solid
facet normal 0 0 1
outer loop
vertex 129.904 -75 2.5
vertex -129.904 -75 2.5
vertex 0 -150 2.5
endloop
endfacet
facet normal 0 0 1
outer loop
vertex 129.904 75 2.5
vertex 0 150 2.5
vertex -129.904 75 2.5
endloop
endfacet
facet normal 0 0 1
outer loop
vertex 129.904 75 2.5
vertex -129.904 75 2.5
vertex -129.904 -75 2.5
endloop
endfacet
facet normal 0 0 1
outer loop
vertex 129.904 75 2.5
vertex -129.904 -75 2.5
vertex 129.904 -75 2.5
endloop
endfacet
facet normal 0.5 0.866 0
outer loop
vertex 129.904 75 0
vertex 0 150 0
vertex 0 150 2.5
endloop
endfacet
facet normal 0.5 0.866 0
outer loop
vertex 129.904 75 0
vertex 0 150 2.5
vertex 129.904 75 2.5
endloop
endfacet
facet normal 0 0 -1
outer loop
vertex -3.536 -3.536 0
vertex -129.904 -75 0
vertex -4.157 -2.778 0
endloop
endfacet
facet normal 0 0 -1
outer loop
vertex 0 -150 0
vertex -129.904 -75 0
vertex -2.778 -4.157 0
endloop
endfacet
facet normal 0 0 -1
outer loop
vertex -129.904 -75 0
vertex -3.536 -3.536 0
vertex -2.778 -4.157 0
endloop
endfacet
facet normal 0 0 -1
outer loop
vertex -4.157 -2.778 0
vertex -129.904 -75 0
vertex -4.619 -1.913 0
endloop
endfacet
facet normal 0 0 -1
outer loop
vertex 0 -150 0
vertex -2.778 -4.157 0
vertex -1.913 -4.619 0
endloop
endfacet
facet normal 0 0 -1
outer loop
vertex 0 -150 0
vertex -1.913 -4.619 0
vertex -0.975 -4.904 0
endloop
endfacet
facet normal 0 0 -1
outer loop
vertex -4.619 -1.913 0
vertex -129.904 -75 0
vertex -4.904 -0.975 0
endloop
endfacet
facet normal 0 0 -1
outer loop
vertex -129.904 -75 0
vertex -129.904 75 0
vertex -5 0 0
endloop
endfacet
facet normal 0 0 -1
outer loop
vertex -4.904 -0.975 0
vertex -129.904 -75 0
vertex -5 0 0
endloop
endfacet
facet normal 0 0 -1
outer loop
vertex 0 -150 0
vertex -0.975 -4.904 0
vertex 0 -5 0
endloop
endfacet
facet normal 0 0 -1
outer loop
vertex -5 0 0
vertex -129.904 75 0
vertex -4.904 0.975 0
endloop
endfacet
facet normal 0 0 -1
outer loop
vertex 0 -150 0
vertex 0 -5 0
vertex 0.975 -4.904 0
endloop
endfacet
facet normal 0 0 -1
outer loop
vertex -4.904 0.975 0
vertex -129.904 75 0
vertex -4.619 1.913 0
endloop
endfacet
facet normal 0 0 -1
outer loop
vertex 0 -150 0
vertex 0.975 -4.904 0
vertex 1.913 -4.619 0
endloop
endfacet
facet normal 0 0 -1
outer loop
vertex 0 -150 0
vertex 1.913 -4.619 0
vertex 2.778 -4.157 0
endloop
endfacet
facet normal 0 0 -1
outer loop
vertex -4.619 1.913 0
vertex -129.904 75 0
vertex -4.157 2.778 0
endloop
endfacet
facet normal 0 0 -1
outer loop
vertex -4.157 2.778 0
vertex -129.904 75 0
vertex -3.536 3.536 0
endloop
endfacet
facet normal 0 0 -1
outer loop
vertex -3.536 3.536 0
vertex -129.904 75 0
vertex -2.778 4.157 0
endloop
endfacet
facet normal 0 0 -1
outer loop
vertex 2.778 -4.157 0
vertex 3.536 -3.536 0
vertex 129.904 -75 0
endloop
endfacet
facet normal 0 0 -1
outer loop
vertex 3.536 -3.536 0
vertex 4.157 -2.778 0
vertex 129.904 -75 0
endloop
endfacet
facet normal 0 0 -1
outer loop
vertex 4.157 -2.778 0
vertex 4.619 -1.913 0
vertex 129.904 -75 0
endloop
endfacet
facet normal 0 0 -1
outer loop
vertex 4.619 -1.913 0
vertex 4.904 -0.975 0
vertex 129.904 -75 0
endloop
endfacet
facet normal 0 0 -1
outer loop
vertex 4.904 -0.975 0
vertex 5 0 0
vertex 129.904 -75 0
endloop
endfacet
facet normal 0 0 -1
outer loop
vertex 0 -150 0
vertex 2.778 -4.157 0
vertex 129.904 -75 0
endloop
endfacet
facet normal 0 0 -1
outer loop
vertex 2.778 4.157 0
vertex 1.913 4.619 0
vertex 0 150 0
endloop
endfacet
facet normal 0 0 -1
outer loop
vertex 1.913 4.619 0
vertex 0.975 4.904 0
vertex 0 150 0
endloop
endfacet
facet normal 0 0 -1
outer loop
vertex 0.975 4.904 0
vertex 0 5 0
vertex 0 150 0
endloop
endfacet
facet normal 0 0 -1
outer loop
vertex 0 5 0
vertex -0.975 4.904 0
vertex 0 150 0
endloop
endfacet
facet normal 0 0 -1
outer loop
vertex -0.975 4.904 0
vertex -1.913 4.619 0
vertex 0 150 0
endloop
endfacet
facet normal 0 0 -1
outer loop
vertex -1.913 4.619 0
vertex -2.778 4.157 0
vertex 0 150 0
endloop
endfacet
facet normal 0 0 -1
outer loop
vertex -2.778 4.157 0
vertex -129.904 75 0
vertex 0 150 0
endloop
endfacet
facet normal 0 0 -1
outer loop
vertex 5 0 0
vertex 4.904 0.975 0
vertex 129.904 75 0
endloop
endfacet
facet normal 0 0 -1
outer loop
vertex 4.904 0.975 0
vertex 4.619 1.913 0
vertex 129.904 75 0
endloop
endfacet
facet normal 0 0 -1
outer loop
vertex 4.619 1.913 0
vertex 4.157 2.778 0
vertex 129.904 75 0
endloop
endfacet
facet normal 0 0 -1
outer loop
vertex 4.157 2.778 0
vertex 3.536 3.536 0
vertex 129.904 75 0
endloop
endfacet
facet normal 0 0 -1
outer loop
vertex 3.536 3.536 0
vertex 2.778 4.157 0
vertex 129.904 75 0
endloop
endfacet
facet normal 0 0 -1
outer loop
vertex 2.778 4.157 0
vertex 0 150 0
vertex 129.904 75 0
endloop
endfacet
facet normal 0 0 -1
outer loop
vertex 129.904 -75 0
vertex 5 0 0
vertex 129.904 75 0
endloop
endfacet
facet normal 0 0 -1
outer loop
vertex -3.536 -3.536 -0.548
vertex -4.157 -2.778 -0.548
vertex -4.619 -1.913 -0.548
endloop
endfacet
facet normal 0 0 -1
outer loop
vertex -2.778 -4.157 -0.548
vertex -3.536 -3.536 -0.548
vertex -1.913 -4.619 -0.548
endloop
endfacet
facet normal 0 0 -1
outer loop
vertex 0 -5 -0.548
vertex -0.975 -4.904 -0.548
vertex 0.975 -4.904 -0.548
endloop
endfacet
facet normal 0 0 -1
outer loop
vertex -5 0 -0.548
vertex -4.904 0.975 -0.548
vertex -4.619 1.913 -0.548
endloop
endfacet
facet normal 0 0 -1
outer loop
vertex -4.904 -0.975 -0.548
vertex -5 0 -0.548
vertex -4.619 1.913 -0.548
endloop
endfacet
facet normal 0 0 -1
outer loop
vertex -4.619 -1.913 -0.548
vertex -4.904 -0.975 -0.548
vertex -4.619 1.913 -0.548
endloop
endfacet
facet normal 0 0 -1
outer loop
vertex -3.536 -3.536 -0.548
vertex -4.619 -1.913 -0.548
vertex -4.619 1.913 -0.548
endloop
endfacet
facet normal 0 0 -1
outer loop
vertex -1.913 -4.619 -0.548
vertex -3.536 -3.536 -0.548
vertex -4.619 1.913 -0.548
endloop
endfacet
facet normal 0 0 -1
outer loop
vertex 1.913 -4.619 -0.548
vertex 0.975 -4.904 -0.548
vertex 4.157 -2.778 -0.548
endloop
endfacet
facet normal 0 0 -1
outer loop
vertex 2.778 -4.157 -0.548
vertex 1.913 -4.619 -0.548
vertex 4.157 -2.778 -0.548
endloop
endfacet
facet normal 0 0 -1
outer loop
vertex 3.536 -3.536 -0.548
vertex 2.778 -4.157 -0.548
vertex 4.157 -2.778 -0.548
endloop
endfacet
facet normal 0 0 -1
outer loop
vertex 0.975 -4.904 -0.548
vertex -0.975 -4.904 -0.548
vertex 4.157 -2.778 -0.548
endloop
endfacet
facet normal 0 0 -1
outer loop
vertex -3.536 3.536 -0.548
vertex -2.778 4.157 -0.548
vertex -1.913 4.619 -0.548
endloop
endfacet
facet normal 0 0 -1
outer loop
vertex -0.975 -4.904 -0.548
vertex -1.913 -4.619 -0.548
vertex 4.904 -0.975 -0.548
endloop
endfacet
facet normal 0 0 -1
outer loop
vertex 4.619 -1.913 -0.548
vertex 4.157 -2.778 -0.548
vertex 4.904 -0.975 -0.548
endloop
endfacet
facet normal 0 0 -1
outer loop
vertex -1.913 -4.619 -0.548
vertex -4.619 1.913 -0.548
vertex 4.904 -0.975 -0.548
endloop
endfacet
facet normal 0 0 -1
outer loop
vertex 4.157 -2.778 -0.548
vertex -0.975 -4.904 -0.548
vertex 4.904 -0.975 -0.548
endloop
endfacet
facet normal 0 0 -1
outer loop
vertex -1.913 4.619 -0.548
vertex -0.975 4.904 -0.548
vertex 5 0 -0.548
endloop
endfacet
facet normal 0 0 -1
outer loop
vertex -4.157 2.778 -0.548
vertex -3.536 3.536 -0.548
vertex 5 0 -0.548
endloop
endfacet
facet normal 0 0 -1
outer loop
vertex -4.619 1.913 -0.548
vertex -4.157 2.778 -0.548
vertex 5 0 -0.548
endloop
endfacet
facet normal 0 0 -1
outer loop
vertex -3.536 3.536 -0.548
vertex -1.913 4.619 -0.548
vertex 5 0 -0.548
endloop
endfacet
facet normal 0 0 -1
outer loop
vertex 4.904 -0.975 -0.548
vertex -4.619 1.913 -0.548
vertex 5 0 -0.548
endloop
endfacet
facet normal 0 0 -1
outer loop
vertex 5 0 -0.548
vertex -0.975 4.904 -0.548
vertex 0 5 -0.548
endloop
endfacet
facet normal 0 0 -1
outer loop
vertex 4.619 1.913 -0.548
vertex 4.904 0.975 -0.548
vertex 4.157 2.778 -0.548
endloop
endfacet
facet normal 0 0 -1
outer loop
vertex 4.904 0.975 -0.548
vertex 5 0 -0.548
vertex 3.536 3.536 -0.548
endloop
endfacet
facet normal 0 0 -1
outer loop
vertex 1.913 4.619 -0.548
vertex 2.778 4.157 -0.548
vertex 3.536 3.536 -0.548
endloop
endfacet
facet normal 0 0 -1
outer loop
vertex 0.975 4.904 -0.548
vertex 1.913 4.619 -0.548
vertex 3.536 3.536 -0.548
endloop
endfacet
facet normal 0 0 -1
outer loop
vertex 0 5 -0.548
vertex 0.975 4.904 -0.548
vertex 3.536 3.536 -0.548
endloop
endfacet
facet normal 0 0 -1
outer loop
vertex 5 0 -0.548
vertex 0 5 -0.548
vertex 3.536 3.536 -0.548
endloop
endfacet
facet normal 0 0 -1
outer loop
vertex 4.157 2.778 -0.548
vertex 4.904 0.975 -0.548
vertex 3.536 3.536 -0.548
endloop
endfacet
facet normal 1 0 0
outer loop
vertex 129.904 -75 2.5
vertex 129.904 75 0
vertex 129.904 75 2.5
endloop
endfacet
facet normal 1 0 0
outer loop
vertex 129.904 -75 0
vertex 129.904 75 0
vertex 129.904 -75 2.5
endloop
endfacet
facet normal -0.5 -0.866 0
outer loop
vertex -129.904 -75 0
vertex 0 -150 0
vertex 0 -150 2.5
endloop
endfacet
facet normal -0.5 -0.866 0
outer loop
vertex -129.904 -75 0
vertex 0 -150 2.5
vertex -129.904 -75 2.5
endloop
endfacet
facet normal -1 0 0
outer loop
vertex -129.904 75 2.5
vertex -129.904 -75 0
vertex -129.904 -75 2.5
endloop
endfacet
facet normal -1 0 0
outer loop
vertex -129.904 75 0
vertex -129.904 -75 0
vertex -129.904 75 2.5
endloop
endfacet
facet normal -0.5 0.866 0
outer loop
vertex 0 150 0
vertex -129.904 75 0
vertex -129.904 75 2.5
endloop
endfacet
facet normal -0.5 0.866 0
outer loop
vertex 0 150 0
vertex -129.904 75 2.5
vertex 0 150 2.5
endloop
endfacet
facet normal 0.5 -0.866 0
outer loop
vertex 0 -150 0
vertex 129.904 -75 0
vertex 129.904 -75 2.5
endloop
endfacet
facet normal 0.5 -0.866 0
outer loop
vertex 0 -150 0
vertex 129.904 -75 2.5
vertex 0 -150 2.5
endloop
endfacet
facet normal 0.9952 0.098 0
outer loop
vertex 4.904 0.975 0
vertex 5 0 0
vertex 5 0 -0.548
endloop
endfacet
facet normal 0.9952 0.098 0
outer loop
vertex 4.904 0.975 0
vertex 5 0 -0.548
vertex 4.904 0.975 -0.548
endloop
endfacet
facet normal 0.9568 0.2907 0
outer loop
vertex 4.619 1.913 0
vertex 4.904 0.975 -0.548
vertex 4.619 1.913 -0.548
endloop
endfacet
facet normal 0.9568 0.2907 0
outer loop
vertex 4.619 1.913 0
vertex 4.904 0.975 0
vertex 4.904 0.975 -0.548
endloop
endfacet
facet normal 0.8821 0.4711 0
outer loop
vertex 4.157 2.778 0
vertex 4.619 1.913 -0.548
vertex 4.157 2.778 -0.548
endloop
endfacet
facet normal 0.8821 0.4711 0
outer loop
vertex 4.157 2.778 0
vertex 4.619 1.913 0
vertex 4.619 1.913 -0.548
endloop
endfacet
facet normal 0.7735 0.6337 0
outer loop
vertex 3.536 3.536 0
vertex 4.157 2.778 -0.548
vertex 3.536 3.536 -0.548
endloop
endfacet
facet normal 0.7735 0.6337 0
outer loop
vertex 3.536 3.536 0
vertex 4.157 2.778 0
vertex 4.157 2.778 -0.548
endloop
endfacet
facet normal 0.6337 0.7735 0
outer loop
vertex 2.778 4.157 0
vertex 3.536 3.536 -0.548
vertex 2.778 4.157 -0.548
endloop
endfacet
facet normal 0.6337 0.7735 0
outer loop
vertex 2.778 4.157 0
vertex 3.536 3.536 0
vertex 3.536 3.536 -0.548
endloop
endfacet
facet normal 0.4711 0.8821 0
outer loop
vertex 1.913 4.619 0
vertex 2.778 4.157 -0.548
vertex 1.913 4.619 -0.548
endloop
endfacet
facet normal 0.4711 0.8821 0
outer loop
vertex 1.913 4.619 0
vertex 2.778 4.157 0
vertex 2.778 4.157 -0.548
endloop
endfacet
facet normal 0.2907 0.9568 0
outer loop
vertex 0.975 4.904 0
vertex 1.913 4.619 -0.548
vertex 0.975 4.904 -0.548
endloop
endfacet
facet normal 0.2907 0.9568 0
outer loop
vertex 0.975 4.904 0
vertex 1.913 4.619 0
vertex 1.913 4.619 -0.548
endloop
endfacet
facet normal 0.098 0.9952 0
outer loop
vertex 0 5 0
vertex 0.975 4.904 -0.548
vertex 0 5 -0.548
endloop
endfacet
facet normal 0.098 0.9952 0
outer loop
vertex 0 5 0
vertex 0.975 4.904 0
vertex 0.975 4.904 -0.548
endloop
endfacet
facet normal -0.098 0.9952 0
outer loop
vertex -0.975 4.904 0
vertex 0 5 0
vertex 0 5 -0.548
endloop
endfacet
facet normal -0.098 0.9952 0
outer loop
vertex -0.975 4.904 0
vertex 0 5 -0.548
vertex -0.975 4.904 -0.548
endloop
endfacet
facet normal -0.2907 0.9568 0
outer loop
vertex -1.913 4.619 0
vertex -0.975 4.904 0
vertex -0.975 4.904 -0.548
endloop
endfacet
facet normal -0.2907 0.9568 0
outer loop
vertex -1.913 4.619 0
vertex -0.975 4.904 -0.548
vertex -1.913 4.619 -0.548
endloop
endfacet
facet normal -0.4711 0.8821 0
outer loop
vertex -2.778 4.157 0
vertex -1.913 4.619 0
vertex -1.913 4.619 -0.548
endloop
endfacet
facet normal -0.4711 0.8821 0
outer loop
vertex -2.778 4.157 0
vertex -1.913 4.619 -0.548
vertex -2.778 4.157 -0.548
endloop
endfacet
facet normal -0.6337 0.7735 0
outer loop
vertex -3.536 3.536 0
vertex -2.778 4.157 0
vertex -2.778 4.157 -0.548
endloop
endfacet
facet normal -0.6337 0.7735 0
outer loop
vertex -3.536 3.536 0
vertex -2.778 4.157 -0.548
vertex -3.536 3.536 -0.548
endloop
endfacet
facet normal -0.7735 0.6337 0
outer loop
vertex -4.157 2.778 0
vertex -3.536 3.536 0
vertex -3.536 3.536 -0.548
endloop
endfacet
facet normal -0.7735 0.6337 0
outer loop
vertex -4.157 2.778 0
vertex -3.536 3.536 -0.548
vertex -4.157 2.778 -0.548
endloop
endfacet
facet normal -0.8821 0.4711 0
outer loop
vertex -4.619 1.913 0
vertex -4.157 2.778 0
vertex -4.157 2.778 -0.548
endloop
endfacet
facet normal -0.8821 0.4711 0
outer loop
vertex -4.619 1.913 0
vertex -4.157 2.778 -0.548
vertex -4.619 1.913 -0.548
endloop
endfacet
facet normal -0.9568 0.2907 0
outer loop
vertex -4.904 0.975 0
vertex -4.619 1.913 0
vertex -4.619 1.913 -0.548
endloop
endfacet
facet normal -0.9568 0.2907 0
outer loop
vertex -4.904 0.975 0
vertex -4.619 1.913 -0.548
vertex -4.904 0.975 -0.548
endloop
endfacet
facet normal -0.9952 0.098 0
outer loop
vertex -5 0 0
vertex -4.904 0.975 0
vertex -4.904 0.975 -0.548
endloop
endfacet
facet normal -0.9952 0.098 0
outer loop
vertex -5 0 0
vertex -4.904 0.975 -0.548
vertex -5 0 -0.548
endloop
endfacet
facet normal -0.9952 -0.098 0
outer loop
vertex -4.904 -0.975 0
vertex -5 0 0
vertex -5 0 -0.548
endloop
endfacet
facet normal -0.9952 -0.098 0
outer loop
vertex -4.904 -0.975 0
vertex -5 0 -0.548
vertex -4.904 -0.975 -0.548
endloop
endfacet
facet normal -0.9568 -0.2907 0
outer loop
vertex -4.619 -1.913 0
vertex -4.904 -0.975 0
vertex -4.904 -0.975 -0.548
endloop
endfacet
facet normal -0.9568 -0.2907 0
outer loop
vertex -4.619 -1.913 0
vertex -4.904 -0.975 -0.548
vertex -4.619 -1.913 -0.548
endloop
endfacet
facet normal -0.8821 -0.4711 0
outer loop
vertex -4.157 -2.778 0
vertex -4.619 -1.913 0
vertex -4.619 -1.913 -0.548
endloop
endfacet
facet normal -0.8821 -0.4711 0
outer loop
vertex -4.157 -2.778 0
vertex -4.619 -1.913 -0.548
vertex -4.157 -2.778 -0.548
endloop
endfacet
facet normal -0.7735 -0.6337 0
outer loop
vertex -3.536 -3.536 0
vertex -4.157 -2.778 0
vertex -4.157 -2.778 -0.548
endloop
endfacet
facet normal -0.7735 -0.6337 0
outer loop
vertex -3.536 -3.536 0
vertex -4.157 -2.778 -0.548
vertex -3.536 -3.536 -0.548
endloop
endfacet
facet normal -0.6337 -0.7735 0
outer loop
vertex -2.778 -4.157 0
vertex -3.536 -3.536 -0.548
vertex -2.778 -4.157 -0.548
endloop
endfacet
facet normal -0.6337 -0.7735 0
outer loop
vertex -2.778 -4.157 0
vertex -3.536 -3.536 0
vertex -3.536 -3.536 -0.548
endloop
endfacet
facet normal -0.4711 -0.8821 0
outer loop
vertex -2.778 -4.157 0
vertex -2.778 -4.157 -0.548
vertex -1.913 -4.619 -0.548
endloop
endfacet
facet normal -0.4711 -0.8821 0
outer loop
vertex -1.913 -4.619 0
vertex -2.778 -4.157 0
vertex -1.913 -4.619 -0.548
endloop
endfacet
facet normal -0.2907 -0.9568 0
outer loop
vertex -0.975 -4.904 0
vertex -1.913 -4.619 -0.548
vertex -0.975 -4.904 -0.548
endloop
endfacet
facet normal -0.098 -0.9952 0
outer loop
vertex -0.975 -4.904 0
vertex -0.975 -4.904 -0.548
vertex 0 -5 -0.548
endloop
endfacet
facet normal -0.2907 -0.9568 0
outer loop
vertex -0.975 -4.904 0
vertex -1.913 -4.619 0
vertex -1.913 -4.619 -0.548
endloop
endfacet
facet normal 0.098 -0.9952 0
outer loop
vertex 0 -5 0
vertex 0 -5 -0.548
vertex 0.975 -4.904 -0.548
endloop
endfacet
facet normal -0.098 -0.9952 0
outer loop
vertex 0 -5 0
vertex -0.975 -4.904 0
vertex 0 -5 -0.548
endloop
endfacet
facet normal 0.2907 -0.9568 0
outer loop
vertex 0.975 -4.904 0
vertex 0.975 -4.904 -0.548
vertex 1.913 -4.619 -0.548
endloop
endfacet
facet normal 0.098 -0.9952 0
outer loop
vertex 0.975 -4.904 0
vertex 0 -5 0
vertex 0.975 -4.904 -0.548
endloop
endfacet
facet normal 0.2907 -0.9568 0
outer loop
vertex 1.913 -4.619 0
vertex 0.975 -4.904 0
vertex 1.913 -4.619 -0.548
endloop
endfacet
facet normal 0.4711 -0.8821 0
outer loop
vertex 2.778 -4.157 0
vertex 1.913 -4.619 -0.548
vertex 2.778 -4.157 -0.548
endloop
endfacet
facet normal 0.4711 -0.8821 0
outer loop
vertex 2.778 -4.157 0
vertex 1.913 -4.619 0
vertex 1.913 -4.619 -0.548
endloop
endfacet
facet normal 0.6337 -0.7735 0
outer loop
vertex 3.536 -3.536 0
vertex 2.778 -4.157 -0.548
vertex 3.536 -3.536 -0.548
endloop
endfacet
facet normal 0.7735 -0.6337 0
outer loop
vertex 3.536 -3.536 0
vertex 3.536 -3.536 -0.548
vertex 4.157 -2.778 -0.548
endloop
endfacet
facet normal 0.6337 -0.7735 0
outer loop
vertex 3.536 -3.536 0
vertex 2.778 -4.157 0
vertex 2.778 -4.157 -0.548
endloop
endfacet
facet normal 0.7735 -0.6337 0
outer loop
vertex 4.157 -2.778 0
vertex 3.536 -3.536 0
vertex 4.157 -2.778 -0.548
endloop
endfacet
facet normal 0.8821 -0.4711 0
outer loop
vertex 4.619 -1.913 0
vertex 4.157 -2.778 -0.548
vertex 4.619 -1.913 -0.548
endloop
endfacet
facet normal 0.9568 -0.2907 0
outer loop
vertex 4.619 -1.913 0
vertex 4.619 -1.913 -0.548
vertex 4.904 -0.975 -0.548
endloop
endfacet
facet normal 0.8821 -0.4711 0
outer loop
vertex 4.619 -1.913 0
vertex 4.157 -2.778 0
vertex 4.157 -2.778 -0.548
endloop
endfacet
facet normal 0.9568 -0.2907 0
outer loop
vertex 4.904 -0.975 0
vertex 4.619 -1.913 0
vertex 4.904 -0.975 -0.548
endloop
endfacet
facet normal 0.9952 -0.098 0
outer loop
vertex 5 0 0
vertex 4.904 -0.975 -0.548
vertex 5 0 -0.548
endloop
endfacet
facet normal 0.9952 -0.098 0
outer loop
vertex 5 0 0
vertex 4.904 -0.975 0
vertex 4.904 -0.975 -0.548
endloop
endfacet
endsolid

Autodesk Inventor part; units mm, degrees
ref_plane "YZ Plane" through (0, 0, 0) normal (1, 0, 0) x (0, 1, 0)
ref_plane "XZ Plane" through (0, 0, 0) normal (0, 1, 0) x (-1, 0, 0)
ref_plane "XY Plane" through (0, 0, 0) normal (0, 0, 1) x (1, 0, 0)
sketch "Sketch1" plane through (0, 0, 0) normal (0, 0, 1) x (1, 0, 0)
  line L0 (0, 150) -> (129.9038, 75)
  line L1 (129.9038, 75) -> (129.9038, -75)
  line L2 (129.9038, -75) -> (0, -150)
  line L3 (0, -150) -> (-129.9038, -75)
  line L4 (-129.9038, -75) -> (-129.9038, 75)
  line L5 (-129.9038, 75) -> (0, 150)
  point P0 (0, 0)
  point P1 (0, 0)
  dimension "d0" = 150
extrude "Extrusion1" add sketch "Sketch1" along normal blind 2.5
sketch "Sketch2" plane through (0, 0, 2.5) normal (0, 0, 1) x (1, 0, 0)
  circle A0 centre (0, 0) radius 5
  dimension "d3" = 10
extrude "Extrusion2" cut sketch "Sketch2" against normal blind 10
sketch "Sketch3" plane through (0, 0, 2.5) normal (0, 0, 1) x (1, 0, 0)
  circle A0 centre (0, 0) radius 5
sheet face with bend "Face1" sketch "Sketch3" thickness 3.048 toward (0, 0, -1) bend radius 3.048
bend "Bend1"
equation "\"d6\" = Thickness"
equation "\"d7\" = BendRadius"
equation "\"d8\" = BendReliefWidth"
equation "\"d10\" = MinimumRemnant"
equation "\"d9\" = BendReliefDepth"
equation "\"d11\" = TransitionRadius"
equation "\"BendRadius\" = Thickness"
equation "\"BendReliefWidth\" = Thickness"
equation "\"BendReliefDepth\" = 0.5 * Thickness"
equation "\"CornerReliefSize\" = 4 * Thickness"
equation "\"MinimumRemnant\" = 2 * Thickness"
equation "\"TransitionRadius\" = BendRadius"
equation "\"JacobiRadiusSize\" = BendRadius"
equation "\"GapSize\" = Thickness"
equation "\"Thickness\" = 3.048"
properties part number "Bottom plate 2.5mm" material "Aluminum 6061"
